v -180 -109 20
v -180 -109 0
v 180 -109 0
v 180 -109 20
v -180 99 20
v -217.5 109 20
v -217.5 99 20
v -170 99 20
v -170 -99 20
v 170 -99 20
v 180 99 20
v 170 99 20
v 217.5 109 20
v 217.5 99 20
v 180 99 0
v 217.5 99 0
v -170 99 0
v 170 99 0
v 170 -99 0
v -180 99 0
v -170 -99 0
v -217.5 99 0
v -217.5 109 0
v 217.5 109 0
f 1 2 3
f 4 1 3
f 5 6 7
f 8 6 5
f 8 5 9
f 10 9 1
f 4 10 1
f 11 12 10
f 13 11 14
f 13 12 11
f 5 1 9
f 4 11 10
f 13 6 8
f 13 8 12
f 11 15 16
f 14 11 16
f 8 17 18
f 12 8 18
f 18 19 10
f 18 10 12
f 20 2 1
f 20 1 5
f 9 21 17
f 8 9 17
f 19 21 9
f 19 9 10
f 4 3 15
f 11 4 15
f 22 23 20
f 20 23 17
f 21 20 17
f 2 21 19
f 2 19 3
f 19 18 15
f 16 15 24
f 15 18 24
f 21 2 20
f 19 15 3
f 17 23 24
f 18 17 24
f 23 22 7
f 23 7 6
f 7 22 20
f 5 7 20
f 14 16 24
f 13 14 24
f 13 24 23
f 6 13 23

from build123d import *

# Parameters (mm, degrees)
SKETCH1_W           = 360
SKETCH1_H           = 218
SKETCH1_W_2         = 340
SKETCH1_H_2         = 198
SKETCH1_W_3         = 37.5
SKETCH1_H_3         = 10
BOSS_EXTRUDE1_DEPTH = 20


with BuildPart() as part:
    # Sketch1 → Boss-Extrude1 (new body)
    with BuildSketch(Plane.XY):
        Rectangle(SKETCH1_W, SKETCH1_H)
        Rectangle(SKETCH1_W_2, SKETCH1_H_2, mode=Mode.SUBTRACT)
        with Locations((-198.75, 104)):
            Rectangle(SKETCH1_W_3, SKETCH1_H_3)
        with Locations((198.75, 104)):
            Rectangle(SKETCH1_W_3, SKETCH1_H_3)
    extrude(amount=BOSS_EXTRUDE1_DEPTH)


solid = part.part
